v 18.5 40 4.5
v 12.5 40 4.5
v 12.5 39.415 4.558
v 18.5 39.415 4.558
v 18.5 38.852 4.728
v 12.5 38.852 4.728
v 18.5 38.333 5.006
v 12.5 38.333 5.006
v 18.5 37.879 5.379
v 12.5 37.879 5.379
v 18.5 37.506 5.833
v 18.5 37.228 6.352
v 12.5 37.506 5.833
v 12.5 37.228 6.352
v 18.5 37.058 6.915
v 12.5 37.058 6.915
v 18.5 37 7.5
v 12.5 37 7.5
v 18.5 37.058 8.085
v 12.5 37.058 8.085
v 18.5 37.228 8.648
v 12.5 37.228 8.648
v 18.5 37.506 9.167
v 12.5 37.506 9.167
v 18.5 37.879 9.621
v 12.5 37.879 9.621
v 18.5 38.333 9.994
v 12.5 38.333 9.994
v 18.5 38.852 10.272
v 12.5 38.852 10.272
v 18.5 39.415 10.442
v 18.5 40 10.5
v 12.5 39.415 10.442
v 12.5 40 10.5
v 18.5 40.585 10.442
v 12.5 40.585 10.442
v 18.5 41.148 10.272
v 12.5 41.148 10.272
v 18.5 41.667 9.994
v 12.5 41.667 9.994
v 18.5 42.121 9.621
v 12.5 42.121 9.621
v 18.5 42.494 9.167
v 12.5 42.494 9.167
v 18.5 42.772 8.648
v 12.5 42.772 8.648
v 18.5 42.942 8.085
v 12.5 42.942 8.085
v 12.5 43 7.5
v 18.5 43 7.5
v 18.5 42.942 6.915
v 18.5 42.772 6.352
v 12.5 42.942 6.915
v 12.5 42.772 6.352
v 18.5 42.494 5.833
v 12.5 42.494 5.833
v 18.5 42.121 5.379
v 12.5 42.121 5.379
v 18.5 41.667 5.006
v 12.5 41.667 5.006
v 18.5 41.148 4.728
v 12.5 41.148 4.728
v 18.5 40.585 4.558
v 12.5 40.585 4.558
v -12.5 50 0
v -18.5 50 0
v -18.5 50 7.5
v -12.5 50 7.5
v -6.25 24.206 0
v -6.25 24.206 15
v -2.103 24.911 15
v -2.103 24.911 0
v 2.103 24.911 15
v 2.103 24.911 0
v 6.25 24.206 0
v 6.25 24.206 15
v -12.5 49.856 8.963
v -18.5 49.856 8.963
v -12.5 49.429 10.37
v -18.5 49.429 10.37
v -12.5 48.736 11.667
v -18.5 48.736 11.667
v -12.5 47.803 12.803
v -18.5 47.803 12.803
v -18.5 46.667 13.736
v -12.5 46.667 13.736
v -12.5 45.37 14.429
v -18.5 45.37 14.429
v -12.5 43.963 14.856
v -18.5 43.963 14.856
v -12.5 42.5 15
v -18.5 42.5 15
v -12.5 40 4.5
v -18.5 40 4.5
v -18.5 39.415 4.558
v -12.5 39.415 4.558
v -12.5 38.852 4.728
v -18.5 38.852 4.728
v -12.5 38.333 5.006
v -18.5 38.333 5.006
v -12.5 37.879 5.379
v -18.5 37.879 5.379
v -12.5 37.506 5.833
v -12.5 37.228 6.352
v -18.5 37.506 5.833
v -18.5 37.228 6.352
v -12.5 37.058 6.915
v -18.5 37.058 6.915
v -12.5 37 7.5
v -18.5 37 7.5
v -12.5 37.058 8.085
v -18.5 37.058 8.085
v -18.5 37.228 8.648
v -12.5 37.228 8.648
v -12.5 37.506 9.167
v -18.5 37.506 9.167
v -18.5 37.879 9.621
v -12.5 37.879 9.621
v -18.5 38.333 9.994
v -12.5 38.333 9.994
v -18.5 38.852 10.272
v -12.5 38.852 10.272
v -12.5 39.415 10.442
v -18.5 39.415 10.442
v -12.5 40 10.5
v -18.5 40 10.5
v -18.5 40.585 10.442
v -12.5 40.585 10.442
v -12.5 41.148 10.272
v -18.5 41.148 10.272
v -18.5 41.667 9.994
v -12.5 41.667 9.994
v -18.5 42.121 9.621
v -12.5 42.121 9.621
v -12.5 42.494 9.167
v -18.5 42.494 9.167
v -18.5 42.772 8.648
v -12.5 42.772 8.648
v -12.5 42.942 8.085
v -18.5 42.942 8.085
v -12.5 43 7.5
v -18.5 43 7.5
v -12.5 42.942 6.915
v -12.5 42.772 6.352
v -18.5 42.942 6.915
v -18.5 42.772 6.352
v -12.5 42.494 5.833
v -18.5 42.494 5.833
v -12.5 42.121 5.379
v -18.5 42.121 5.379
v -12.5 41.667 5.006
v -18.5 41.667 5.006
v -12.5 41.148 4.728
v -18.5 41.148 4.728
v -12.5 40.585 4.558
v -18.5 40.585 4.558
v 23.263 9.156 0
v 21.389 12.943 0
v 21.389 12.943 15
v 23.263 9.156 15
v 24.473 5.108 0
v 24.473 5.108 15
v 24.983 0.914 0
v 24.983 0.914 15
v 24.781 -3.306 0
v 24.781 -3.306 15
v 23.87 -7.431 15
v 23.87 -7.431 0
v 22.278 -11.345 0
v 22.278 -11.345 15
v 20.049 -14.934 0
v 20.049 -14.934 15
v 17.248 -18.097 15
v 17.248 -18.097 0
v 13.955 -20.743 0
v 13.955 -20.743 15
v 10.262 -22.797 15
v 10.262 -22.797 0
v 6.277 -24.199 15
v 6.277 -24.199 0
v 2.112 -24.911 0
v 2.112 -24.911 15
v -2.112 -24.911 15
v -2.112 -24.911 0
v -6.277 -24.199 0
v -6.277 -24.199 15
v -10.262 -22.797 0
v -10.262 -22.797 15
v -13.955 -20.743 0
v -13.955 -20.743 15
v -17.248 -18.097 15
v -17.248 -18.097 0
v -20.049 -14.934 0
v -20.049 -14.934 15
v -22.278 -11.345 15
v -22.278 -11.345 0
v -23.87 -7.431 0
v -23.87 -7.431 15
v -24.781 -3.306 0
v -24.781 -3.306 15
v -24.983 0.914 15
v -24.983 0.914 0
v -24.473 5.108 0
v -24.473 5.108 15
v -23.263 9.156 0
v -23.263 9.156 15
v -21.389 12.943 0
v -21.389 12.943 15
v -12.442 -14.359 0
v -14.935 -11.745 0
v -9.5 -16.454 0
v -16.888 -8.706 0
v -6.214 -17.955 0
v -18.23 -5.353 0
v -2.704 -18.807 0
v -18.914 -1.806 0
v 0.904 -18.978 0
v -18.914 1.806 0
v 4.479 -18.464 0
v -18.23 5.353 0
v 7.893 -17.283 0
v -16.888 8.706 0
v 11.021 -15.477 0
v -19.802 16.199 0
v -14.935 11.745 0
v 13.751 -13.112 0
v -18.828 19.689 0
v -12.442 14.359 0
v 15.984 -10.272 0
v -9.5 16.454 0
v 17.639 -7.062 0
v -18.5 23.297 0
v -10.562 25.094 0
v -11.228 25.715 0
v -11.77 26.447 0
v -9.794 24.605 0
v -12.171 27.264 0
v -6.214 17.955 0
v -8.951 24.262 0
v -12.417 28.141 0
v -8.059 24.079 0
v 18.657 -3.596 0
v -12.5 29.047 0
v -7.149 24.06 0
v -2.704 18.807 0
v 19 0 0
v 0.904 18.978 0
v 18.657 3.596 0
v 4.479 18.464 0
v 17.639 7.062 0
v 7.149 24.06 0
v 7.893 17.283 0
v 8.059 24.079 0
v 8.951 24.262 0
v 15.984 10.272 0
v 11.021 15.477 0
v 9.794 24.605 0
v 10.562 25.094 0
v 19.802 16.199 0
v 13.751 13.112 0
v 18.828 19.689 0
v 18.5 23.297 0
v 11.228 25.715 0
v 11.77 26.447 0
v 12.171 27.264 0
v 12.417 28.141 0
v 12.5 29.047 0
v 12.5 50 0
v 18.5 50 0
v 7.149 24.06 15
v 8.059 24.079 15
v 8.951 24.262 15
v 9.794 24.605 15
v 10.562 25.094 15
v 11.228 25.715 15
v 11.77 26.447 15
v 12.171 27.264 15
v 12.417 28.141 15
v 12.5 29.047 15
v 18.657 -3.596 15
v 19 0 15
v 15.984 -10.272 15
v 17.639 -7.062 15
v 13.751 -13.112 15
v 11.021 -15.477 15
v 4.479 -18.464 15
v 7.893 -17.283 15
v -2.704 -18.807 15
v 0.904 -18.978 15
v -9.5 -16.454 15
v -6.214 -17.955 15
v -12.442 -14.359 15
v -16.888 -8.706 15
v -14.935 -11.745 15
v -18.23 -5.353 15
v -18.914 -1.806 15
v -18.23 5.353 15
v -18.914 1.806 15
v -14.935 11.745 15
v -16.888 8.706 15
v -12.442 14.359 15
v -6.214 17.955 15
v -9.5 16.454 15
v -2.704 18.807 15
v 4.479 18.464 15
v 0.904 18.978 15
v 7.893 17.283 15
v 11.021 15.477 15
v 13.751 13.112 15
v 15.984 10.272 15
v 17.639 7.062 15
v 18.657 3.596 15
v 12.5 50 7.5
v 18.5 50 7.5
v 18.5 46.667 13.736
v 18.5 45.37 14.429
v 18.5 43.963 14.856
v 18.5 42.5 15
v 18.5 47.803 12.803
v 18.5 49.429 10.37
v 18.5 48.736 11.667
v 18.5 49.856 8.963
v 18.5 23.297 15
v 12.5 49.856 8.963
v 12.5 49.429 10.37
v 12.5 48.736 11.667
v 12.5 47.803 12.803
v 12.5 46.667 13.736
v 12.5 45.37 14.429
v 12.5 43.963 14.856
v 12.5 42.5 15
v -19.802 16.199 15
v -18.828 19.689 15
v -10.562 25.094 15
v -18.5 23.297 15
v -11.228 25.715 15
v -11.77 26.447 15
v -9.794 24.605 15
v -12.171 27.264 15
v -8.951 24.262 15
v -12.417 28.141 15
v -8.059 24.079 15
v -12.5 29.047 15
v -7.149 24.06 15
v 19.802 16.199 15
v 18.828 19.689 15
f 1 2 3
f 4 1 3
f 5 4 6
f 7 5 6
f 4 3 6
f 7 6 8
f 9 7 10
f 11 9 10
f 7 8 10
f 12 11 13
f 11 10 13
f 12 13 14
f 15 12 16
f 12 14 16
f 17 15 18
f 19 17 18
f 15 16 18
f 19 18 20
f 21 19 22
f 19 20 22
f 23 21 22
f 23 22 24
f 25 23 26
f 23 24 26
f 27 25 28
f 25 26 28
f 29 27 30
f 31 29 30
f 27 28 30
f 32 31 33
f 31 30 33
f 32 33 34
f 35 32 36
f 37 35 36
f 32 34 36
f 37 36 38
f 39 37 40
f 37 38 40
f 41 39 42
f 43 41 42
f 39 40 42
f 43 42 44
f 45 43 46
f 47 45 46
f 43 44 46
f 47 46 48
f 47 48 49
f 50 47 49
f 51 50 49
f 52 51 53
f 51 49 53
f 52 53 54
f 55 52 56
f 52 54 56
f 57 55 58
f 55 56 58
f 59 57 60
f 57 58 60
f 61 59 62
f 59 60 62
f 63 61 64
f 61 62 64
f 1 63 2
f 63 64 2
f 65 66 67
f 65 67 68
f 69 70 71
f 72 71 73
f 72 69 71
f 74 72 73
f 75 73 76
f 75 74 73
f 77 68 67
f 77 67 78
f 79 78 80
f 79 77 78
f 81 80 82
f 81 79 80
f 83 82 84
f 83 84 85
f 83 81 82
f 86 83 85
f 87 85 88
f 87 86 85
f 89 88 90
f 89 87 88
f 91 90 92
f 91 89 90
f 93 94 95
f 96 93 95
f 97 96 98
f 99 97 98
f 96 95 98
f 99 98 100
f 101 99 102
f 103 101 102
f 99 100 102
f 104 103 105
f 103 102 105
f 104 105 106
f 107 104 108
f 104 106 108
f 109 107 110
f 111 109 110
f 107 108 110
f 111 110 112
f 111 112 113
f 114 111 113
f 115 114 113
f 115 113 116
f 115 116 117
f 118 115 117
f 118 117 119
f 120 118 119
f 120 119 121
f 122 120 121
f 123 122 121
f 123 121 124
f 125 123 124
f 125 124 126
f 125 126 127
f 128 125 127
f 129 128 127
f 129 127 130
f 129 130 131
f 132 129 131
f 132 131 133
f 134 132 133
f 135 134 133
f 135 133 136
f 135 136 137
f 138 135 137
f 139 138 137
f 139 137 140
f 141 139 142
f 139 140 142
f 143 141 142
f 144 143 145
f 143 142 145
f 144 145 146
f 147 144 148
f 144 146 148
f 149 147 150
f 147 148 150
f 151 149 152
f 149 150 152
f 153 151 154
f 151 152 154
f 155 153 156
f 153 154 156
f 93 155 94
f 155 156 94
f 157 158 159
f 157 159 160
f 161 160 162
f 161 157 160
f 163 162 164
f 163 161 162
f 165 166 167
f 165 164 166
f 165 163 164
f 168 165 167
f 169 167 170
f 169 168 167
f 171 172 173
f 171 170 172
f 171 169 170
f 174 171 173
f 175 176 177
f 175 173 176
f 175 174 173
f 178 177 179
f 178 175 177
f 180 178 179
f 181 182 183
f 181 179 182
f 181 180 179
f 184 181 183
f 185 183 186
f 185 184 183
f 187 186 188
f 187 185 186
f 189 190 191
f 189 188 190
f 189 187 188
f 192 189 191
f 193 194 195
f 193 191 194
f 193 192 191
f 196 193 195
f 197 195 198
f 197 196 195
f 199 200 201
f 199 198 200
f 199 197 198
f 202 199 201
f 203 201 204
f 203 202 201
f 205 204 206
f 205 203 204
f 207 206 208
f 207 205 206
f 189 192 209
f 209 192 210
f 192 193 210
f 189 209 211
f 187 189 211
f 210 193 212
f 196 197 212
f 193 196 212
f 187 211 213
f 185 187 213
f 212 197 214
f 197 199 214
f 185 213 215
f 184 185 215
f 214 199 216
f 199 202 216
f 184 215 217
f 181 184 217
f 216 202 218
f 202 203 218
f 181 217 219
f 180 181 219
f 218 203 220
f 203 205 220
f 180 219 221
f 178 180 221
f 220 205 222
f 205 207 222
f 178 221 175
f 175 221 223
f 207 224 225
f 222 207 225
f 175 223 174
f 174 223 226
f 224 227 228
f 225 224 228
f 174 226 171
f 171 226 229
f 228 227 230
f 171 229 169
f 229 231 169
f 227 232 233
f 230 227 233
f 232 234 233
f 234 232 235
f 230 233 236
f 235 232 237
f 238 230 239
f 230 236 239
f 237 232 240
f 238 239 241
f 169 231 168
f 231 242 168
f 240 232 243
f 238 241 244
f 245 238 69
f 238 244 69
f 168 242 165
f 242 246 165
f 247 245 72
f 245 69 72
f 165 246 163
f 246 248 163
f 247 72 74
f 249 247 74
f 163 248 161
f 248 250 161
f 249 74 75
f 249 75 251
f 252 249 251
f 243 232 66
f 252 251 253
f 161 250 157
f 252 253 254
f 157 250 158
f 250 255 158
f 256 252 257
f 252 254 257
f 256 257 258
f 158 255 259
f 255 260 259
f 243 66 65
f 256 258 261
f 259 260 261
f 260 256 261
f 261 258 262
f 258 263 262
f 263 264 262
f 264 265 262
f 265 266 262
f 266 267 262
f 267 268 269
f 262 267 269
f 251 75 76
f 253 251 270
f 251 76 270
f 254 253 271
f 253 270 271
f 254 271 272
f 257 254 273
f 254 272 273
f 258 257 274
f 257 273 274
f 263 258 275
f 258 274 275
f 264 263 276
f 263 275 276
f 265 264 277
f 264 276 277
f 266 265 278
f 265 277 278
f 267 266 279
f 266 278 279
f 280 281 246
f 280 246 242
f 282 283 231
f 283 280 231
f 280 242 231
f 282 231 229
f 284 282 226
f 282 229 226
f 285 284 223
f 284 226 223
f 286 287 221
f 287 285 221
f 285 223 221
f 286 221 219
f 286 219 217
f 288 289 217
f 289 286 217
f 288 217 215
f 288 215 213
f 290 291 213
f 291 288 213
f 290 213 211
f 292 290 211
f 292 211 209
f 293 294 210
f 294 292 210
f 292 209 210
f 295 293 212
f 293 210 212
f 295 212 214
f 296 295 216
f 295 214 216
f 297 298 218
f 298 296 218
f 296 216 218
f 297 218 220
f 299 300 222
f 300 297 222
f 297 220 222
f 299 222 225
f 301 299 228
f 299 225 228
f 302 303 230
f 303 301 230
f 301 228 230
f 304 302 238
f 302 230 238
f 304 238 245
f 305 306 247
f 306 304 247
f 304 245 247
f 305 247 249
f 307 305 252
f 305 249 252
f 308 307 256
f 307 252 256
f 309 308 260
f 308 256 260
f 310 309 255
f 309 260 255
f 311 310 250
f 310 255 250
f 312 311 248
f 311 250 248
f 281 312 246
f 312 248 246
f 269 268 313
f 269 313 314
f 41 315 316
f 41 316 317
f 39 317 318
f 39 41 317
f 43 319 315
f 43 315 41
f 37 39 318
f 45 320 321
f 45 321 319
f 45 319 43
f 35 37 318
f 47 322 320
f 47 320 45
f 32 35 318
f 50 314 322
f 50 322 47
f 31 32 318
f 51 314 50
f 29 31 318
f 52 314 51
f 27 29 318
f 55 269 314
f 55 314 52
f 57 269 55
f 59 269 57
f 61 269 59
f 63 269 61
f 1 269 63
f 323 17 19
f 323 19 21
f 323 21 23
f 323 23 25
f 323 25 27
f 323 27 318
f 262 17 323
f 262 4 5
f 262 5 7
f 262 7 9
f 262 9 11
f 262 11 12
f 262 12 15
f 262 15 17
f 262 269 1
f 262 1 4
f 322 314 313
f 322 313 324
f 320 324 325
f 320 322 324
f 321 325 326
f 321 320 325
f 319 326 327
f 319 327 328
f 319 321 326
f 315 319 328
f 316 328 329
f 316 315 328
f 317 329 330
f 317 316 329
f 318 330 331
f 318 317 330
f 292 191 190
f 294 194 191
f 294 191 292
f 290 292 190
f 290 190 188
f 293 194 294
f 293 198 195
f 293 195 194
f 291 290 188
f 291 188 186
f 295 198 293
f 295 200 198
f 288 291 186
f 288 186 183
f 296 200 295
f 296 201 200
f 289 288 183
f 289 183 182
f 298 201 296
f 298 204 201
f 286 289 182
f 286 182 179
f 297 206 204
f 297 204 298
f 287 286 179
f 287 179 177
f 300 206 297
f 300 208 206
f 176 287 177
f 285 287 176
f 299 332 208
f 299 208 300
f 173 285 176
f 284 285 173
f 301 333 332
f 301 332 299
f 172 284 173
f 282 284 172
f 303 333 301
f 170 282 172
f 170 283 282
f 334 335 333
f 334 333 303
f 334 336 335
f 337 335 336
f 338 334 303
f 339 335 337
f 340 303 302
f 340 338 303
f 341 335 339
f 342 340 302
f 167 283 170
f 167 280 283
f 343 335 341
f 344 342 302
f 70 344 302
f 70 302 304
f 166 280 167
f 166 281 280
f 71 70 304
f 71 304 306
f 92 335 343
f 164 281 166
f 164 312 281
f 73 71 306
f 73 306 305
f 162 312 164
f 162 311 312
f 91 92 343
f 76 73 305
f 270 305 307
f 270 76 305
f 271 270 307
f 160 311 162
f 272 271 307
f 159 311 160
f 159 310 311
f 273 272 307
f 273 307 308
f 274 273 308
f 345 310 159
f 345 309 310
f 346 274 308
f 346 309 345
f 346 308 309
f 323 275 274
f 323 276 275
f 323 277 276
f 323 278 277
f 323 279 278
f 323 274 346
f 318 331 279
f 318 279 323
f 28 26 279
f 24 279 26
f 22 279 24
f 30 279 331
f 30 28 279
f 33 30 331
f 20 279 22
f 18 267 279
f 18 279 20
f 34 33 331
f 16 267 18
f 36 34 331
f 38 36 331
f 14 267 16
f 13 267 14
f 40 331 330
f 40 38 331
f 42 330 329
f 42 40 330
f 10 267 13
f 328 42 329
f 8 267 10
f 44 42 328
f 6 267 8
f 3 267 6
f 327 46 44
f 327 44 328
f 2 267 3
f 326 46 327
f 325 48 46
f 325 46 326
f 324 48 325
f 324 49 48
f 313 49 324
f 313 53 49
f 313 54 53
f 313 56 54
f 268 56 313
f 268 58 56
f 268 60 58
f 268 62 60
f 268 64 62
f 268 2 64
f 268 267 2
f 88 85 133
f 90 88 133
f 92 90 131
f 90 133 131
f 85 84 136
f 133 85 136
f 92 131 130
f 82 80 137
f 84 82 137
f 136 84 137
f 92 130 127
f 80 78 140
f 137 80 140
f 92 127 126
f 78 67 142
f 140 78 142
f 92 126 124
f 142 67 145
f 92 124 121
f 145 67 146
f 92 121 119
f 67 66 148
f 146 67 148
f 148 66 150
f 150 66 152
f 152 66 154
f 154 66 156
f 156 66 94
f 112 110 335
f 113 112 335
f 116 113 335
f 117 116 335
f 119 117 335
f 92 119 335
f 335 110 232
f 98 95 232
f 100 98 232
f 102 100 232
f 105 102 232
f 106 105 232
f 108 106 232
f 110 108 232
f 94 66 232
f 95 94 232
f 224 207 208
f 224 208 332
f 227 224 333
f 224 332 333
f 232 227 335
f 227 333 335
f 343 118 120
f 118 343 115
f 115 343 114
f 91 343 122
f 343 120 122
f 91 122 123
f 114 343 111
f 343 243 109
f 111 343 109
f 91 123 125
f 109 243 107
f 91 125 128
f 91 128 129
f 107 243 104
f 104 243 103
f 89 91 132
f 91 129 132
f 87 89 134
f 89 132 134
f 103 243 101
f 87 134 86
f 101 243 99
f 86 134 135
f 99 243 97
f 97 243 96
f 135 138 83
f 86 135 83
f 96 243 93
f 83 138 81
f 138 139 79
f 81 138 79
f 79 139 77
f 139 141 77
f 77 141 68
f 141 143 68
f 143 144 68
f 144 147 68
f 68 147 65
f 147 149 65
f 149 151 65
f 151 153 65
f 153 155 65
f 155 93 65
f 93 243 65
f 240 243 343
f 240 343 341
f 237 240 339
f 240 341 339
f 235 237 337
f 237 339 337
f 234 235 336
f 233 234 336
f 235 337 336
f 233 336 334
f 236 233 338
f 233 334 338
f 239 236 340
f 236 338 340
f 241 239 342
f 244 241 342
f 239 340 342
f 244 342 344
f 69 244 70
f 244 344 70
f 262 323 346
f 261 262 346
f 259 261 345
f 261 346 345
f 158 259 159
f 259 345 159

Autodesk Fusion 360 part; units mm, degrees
sketch "Sketch1" plane through (0, 0, 0) normal (0, 0, 1) x (1, 0, 0)
  circle A0 centre (0, 0) radius 19
  line L0 (0, 0) -> (0, 68.0684) construction
  line L1 (-12.5, 21.6506) -> (-12.5, 50)
  line L2 (-18.5, 50) -> (-12.5, 50)
  line L3 (12.5, 50) -> (18.5, 50)
  line L4 (-18.5, 50) -> (-18.5, 16.8152)
  line L5 (12.5, 21.6506) -> (12.5, 50)
  line L6 (18.5, 50) -> (18.5, 16.8152)
  arc A1 (-18.5, 16.8152) -> (18.5, 16.8152) centre (0, 0) ccw
  arc A2 (12.5, 21.6506) -> (-12.5, 21.6506) centre (0, 0) ccw
  dimension "d1" = 38
  dimension "d3" = 12.5
  dimension "d5" = 6
extrude "Extrude1" add sketch "Sketch1" along normal blind 15
fillet "Fillet1" radius 20 1 edges at (-18.5, 16.8152, 7.5)
fillet "Fillet2" radius 20 1 edges at (18.5, 16.8152, 7.5)
fillet "Fillet3" radius 5 1 edges at (-12.5, 21.6506, 7.5)
fillet "Fillet4" radius 5 1 edges at (12.5, 21.6506, 7.5)
sketch "Sketch2" plane through (18.5, 0, 0) normal (1, 0, 0) x (0, 1, 0)
  line L0 (23.297, 15) -> (23.297, 0)
  line L1 (23.297, 0) -> (50, 0)
  line L2 (50, 0) -> (50, 15)
  line L3 (50, 15) -> (23.297, 15)
  point P0 (40, 7.5)
  dimension "d17" = 7.5
  dimension "d18" = 10
hole "Hole1" at (18.5, 40, 7.5) direction (-1, 0, 0) diameter 6 depth 70 tip angle 118
fillet "Fillet5" radius 7.5 2 edges at (15.5, 50, 15) (-15.5, 50, 15)
